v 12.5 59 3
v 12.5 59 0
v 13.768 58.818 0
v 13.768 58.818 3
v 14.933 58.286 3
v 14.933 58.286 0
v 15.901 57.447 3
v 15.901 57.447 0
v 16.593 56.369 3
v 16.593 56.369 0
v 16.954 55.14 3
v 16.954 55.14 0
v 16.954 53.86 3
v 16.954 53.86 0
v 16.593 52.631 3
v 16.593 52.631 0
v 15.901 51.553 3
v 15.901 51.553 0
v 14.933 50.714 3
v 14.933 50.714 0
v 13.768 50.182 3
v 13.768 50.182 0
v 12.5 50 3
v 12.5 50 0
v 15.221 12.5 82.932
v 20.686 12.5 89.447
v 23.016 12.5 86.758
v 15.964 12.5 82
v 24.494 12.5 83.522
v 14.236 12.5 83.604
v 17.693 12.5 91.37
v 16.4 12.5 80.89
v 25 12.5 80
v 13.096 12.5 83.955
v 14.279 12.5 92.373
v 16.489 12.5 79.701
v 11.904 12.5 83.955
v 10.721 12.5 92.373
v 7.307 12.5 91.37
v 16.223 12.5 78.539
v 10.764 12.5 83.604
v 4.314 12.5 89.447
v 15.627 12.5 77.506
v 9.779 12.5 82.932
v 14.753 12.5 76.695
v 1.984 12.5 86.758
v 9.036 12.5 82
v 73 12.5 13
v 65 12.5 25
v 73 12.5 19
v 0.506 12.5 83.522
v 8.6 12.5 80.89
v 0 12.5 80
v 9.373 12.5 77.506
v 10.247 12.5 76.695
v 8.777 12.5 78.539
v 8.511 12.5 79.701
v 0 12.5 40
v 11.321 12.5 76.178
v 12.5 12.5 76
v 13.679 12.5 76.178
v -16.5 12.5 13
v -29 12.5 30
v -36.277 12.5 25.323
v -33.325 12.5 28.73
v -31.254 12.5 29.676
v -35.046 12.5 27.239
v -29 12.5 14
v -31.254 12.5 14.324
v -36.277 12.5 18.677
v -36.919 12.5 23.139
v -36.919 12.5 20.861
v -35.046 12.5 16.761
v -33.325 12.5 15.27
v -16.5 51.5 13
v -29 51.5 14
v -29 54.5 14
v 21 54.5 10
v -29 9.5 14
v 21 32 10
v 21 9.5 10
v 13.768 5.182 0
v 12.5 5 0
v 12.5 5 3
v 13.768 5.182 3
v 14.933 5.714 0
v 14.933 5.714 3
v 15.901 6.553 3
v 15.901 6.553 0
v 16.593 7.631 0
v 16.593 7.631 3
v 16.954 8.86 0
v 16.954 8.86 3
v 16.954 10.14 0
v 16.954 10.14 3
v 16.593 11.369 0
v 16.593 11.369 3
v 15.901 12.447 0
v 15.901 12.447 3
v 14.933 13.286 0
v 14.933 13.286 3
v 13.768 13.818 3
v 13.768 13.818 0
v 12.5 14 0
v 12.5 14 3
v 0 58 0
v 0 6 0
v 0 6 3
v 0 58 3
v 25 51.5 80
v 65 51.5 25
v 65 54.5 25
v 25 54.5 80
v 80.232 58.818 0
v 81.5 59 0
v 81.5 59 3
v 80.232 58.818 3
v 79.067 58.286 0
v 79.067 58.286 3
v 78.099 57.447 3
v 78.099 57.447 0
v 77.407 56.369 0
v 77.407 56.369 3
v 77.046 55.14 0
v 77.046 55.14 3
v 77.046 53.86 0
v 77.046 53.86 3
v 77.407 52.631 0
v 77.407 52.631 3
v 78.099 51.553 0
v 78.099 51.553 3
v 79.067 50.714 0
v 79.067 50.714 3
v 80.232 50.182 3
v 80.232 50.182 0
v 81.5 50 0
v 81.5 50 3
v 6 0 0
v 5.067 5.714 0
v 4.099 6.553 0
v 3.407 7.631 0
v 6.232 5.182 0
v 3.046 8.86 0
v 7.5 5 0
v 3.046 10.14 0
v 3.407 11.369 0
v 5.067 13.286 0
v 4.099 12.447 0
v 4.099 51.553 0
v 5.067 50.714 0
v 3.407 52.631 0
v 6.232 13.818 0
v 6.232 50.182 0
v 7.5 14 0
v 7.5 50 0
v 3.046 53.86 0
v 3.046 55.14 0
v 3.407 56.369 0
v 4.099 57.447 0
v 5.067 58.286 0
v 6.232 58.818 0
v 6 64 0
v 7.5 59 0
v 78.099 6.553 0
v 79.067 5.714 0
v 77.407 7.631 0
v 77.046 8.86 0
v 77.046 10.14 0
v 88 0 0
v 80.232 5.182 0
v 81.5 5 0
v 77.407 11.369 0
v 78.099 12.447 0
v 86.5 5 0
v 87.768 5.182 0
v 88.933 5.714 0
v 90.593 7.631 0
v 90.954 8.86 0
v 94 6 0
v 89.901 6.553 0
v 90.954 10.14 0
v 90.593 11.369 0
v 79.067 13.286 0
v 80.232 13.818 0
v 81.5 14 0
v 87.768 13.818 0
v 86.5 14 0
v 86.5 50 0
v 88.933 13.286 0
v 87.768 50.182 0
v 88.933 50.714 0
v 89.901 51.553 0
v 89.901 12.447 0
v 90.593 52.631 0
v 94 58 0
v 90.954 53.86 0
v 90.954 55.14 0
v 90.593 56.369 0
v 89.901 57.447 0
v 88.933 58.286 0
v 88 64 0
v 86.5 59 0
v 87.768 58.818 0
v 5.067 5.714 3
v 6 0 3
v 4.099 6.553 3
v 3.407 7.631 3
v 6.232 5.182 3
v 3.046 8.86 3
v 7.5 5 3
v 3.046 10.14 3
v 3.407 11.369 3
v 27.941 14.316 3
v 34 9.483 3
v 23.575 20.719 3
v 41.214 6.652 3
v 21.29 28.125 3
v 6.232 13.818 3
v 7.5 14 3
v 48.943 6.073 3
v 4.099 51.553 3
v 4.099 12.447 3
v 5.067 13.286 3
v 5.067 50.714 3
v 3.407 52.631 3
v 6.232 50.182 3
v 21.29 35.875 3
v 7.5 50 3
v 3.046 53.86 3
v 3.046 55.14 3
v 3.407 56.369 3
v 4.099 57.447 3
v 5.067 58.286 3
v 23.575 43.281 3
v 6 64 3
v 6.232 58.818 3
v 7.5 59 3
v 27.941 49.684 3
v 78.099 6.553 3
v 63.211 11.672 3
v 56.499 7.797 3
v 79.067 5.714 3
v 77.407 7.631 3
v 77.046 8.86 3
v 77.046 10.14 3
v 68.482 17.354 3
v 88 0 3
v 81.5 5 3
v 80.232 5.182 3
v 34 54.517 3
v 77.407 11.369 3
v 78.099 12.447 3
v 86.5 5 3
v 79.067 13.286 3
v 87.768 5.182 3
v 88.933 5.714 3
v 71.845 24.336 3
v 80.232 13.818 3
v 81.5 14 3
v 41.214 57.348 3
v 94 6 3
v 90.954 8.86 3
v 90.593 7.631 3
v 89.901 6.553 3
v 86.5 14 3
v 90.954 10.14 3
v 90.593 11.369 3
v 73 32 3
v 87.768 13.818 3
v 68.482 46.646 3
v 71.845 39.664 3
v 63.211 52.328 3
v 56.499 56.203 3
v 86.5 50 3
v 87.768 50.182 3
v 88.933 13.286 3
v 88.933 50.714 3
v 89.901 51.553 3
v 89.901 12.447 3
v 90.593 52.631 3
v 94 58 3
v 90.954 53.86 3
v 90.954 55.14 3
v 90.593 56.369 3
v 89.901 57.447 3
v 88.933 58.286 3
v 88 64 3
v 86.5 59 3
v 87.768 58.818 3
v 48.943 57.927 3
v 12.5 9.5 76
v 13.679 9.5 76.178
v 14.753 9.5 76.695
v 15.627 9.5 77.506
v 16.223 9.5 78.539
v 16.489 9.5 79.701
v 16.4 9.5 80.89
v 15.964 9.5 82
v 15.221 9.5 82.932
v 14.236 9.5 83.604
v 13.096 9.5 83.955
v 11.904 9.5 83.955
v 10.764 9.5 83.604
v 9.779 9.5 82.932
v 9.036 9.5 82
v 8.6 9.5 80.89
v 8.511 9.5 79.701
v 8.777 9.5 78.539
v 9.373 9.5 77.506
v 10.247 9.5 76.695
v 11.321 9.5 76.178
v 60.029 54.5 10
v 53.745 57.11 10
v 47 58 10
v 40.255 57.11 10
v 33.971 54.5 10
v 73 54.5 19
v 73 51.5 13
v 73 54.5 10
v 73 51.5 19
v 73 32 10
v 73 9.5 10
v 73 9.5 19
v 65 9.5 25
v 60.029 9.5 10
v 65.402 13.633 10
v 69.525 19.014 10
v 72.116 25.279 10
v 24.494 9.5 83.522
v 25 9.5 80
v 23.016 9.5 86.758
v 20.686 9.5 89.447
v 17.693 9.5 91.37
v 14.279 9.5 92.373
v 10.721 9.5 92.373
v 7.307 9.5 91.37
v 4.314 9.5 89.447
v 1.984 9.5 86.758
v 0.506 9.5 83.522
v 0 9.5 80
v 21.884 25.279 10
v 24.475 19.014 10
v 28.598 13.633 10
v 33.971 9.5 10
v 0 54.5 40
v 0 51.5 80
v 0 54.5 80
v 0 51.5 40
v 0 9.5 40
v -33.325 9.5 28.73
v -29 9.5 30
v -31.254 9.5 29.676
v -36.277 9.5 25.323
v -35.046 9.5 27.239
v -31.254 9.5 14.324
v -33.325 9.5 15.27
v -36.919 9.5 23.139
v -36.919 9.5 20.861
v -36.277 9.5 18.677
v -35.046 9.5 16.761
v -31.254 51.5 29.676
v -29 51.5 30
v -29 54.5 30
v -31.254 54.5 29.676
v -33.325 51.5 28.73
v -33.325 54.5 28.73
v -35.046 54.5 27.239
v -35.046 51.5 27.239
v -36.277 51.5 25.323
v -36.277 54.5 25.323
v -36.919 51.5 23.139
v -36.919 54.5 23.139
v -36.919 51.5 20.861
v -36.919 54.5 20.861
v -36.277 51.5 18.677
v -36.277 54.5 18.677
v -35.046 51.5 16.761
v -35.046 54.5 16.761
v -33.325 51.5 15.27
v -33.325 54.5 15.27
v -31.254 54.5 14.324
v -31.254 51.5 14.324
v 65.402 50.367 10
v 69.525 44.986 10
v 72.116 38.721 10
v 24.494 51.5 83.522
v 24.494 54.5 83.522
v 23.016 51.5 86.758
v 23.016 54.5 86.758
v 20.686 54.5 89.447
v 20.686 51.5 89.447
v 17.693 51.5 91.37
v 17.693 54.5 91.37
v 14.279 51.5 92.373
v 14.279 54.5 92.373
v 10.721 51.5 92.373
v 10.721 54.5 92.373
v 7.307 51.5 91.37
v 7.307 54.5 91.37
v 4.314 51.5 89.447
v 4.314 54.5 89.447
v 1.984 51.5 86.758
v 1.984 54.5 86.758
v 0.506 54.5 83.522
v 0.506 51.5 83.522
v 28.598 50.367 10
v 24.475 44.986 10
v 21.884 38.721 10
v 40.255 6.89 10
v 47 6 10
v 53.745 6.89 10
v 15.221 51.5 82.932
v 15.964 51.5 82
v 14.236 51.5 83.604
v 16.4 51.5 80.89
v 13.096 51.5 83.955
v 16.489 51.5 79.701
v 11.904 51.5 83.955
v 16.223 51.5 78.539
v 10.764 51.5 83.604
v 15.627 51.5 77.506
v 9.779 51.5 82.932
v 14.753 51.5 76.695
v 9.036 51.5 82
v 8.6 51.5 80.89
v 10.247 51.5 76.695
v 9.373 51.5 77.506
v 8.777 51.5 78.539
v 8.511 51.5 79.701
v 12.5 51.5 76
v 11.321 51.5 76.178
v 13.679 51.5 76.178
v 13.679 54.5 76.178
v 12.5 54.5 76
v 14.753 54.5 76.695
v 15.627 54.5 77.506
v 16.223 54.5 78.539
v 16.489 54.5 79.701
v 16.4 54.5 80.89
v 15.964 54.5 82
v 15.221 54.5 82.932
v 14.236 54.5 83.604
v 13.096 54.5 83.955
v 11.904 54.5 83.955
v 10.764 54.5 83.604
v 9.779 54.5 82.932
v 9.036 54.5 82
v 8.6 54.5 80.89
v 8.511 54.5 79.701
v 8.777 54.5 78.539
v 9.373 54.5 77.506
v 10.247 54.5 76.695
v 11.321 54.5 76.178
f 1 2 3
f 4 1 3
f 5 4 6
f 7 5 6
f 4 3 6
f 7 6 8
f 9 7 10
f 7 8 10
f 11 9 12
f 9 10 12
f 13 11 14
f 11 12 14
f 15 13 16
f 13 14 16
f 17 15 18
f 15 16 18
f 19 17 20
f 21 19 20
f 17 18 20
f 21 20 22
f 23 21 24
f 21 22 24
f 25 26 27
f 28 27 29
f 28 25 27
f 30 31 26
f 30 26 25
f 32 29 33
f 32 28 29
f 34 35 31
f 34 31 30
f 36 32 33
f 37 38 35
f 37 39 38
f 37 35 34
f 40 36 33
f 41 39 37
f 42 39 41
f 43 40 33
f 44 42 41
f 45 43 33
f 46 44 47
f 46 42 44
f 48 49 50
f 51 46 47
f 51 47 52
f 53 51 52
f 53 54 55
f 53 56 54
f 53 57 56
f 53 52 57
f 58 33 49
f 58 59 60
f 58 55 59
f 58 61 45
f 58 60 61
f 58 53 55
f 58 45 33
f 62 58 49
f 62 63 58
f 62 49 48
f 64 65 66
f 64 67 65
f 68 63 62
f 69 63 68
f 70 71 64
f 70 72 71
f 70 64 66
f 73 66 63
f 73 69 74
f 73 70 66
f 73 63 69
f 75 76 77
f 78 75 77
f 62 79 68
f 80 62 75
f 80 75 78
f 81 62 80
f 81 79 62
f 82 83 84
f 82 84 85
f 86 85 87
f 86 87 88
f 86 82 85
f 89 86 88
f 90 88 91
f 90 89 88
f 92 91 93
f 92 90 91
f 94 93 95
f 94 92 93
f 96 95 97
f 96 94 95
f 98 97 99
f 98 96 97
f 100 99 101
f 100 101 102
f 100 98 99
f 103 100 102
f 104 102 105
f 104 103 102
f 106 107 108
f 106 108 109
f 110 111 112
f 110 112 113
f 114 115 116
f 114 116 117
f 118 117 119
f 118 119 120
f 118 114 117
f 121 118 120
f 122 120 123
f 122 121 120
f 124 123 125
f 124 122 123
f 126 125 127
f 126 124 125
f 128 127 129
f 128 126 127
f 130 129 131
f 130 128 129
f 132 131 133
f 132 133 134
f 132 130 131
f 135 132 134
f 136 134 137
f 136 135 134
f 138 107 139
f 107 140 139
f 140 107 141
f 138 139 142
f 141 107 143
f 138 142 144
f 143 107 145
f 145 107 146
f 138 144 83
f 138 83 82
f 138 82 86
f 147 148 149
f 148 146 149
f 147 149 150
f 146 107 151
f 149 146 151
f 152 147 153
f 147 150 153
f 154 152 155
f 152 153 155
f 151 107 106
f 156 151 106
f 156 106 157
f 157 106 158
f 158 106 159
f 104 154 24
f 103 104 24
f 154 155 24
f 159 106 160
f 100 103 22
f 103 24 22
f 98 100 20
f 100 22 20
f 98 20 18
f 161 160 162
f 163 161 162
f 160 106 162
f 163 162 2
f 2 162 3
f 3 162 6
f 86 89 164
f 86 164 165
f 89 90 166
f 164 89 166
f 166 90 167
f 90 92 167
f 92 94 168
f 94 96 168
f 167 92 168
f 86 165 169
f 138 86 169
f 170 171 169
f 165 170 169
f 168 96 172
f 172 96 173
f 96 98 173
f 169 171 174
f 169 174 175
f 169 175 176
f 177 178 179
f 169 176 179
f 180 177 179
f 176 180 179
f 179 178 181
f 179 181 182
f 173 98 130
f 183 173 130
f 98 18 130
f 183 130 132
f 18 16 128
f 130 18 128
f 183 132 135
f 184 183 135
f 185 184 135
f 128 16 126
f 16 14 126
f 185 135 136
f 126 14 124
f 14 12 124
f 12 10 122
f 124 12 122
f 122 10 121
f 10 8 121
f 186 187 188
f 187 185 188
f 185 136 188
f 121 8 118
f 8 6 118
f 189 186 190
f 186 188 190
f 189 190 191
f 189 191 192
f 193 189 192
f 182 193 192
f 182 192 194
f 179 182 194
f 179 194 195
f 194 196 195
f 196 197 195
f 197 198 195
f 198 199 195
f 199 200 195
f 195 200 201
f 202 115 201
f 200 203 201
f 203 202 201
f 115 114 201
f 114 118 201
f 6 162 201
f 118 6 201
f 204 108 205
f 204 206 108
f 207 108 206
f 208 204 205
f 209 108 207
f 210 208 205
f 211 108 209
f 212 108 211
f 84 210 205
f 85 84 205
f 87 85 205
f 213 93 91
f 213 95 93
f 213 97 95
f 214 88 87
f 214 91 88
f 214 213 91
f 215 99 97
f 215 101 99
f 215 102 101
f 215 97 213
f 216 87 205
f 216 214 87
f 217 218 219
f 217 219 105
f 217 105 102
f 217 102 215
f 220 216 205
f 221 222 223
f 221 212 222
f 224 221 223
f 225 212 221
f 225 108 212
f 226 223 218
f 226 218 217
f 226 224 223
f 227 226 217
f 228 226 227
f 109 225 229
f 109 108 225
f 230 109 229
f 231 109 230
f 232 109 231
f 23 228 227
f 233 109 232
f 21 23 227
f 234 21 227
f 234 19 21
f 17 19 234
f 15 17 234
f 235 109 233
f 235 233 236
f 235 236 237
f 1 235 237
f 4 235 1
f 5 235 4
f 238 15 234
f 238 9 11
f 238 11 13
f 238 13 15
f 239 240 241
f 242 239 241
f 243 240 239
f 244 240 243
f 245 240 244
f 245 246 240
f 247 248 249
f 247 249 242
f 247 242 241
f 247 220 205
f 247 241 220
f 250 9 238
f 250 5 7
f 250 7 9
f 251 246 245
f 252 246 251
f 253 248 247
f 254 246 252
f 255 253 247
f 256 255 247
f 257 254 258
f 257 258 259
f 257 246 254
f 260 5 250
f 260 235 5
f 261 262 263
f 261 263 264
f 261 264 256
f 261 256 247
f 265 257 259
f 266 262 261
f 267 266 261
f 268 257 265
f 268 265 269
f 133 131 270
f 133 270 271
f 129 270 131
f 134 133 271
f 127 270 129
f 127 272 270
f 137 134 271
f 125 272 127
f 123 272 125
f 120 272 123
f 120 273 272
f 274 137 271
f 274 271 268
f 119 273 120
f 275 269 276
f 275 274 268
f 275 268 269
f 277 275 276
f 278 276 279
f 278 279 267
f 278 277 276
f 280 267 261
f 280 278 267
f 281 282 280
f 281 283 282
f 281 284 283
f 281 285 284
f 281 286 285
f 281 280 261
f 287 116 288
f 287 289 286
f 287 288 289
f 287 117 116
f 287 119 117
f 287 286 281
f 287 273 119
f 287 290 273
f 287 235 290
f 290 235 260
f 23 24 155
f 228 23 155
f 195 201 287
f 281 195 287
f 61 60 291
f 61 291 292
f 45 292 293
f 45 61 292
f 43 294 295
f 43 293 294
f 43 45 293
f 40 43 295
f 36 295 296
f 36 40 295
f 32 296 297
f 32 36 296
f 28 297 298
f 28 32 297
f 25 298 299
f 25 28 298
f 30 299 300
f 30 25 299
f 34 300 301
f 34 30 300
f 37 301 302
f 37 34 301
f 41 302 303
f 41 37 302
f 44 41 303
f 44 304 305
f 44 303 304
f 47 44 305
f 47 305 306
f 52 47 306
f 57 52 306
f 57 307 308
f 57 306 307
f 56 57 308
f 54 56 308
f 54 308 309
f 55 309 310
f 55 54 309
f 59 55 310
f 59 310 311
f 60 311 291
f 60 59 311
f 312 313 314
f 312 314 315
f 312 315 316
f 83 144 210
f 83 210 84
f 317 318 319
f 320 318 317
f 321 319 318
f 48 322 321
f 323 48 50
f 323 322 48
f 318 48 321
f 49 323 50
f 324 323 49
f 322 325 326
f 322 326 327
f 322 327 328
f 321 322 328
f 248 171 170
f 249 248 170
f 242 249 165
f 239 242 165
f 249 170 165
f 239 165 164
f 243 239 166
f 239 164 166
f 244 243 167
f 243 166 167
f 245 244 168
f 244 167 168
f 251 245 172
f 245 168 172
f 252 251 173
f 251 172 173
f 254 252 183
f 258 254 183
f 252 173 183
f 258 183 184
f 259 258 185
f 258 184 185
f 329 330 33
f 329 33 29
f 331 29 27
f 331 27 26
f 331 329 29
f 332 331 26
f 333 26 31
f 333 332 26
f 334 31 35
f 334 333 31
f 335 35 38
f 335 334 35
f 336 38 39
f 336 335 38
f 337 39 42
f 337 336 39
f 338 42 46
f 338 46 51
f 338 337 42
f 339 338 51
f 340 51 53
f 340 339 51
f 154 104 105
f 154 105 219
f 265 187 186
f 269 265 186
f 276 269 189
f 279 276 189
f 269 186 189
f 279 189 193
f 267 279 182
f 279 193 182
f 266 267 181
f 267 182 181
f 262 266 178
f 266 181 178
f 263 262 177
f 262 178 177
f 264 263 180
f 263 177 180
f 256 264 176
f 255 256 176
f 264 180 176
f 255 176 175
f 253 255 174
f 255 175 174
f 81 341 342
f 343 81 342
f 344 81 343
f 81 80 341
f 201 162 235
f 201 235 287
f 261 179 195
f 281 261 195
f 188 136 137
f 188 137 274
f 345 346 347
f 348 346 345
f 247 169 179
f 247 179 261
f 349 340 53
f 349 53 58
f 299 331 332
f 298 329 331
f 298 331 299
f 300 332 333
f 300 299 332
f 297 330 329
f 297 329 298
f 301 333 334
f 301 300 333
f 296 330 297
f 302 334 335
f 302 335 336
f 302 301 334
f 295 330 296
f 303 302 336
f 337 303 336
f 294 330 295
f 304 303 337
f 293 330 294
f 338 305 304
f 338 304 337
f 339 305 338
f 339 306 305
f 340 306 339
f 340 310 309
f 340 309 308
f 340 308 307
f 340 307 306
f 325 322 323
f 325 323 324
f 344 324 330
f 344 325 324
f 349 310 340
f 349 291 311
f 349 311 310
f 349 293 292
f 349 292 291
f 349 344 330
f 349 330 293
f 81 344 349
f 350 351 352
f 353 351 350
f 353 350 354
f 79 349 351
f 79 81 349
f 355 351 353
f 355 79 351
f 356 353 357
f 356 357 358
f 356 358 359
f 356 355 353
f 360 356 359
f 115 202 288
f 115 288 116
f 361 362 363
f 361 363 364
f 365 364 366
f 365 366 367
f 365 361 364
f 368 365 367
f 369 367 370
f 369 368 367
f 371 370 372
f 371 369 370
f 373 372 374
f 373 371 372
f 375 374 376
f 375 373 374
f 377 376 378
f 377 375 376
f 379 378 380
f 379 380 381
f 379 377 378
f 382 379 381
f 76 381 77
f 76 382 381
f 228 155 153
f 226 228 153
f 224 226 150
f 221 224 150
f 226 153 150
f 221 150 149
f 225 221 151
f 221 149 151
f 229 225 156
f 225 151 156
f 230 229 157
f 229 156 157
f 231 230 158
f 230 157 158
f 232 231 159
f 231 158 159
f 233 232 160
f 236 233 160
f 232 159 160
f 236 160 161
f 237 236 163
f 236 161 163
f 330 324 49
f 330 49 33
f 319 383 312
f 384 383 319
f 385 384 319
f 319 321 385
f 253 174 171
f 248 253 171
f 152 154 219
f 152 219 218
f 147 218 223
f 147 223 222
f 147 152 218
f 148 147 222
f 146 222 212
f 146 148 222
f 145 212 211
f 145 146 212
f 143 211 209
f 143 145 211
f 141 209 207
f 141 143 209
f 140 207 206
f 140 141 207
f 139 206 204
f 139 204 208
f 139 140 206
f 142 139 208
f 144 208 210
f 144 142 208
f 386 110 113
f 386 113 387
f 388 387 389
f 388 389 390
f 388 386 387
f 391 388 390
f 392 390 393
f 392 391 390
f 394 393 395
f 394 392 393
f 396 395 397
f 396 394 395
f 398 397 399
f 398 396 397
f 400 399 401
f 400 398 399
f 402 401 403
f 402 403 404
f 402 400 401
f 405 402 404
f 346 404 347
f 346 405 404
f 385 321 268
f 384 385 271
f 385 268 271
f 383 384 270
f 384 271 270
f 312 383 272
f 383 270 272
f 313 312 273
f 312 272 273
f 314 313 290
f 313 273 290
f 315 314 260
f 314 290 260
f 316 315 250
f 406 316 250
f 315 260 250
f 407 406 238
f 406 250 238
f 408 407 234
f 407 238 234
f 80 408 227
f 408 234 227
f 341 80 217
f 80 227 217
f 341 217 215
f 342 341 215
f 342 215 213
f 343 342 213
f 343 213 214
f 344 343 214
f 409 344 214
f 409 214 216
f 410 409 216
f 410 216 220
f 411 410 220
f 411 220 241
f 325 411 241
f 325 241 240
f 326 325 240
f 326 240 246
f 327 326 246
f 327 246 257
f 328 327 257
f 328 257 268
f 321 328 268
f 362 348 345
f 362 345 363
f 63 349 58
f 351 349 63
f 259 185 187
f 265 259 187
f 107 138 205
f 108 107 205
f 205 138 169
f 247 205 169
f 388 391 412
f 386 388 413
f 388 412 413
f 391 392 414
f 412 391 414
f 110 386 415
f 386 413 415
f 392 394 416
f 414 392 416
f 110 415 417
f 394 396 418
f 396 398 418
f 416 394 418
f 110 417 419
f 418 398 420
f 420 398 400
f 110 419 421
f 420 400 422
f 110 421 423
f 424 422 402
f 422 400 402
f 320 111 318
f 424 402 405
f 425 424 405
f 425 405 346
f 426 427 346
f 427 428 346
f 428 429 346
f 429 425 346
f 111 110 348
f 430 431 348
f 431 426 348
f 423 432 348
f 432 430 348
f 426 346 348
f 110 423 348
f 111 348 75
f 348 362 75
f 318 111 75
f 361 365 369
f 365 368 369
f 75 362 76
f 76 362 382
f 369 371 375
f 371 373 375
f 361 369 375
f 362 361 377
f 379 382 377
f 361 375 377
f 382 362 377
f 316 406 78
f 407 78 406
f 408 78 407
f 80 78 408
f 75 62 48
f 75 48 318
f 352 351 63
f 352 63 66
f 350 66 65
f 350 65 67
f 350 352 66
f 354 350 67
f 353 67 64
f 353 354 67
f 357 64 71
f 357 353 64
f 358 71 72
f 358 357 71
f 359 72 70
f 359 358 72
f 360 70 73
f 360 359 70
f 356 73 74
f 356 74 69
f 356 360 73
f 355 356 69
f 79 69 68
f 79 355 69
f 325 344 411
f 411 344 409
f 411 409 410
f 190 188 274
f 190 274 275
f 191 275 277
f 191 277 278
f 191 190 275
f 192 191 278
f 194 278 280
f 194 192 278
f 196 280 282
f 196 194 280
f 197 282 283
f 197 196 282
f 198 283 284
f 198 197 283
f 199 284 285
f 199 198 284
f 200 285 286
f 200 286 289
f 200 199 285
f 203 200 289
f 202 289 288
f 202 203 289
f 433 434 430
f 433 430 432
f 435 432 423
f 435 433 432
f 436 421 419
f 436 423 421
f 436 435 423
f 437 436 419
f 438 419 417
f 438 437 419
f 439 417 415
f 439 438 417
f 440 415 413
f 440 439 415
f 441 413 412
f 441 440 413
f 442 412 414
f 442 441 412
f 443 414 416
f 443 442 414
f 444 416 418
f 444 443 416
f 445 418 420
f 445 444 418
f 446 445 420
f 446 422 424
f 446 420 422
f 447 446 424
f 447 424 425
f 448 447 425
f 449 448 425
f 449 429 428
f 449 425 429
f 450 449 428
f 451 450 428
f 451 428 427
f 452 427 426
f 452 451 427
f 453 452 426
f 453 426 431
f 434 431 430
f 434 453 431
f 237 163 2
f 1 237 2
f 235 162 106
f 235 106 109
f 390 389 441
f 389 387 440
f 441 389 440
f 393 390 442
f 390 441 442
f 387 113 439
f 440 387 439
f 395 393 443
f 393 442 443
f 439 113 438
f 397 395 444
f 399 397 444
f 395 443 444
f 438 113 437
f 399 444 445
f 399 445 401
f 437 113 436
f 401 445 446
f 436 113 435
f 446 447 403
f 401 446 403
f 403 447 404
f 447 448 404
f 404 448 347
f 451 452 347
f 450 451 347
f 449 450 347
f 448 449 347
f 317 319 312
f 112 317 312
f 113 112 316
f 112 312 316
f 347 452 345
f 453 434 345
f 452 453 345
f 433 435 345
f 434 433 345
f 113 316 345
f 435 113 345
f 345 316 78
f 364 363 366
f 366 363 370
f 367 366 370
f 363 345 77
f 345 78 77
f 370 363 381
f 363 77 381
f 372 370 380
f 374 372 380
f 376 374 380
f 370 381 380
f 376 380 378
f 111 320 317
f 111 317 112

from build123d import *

# Parameters (mm, degrees)
ESQUISSE1_W                  = 94
ESQUISSE1_H                  = 64
BOSS_EXTRU_1_DEPTH           = 3
ESQUISSE2_R                  = 26
BOSS_EXTRU_2_DEPTH           = 7
BOSS_EXTRU_3_DEPTH           = 22.5
BOSS_EXTRU_3_DEPTH_BACK      = 22.5
ENL_V_MAT_EXTRU_1_DEPTH      = 173.665138346
ENL_V_MAT_EXTRU_1_DEPTH_BACK = 173.665138346
ESQUISSE4_W                  = 86
ESQUISSE4_H                  = 39
ENL_V_MAT_EXTRU_2_DEPTH      = 143.697231928
ENL_V_MAT_EXTRU_2_DEPTH_BACK = 143.697231928
ESQUISSE5_R                  = 4
ENL_V_MAT_EXTRU_3_DEPTH      = 3
CHANFREIN1_SIZE              = 6


with BuildPart() as part:
    # Esquisse1 → Boss.-Extru.1 (new body)
    with BuildSketch(Plane.XY):
        with Locations((47, 32)):
            Rectangle(ESQUISSE1_W, ESQUISSE1_H)
    extrude(amount=BOSS_EXTRU_1_DEPTH)

    # Esquisse2 → Boss.-Extru.2 (add)
    with BuildSketch(Plane.XY.offset(3)):
        with Locations((47, 32)):
            Circle(ESQUISSE2_R)
    extrude(amount=BOSS_EXTRU_2_DEPTH)

    # Esquisse3 → Boss.-Extru.3 (add, two sides: drawn at the far end of the back side and taken through both)
    with BuildSketch(Plane(origin=(0, 32, 0), x_dir=(1, 0, 0), z_dir=(0, 1, 0)).offset(-BOSS_EXTRU_3_DEPTH_BACK)):
        with BuildLine():
            Line((73, -10), (73, -19))
            Line((73, -19), (65, -25))
            Line((65, -25), (25, -80))
            ThreePointArc((25, -80), (12.5, -92.5), (0, -80))
            Line((0, -80), (0, -40))
            Line((0, -40), (-29, -30))
            ThreePointArc((-29, -30), (-37, -22), (-29, -14))
            Line((-29, -14), (21, -10))
            Line((21, -10), (73, -10))
        make_face()
    extrude(amount=BOSS_EXTRU_3_DEPTH + BOSS_EXTRU_3_DEPTH_BACK)

    # Esquisse4 → Enlèv. mat.-Extru.1 (cut, two sides: drawn at the far end of the back side and taken through both)
    with BuildSketch(Plane(origin=(94, 0, 0), x_dir=(0, 0, -1), z_dir=(1, 0, 0)).offset(-ENL_V_MAT_EXTRU_1_DEPTH_BACK)):
        with Locations((-56, 32)):
            Rectangle(ESQUISSE4_W, ESQUISSE4_H)
    extrude(amount=ENL_V_MAT_EXTRU_1_DEPTH + ENL_V_MAT_EXTRU_1_DEPTH_BACK, mode=Mode.SUBTRACT)

    # Esquisse5 → Enlèv. mat.-Extru.2 (cut, two sides: drawn at the far end of the back side and taken through both)
    with BuildSketch(Plane.XZ.offset(-9.5).offset(-ENL_V_MAT_EXTRU_2_DEPTH_BACK)):
        with Locations(Location((12.5, 80, 0), (0, 0, 270))):
            Circle(ESQUISSE5_R)
    extrude(amount=ENL_V_MAT_EXTRU_2_DEPTH + ENL_V_MAT_EXTRU_2_DEPTH_BACK, mode=Mode.SUBTRACT)

    # Esquisse6 → Enlèv. mat.-Extru.3 (cut)
    with BuildSketch(Plane(origin=(0, 0, 0), x_dir=(-1, 0, 0), z_dir=(0, 0, -1))):
        with BuildLine():
            Line((-86.5, 59), (-81.5, 59))
            ThreePointArc((-81.5, 59), (-77, 54.5), (-81.5, 50))
            Line((-81.5, 50), (-86.5, 50))
            ThreePointArc((-86.5, 50), (-91, 54.5), (-86.5, 59))
        make_face()
        with BuildLine():
            Line((-7.5, 59), (-12.5, 59))
            ThreePointArc((-12.5, 59), (-17, 54.5), (-12.5, 50))
            Line((-12.5, 50), (-7.5, 50))
            ThreePointArc((-7.5, 50), (-3, 54.5), (-7.5, 59))
        make_face()
        with BuildLine():
            Line((-7.5, 5), (-12.5, 5))
            ThreePointArc((-12.5, 5), (-17, 9.5), (-12.5, 14))
            Line((-12.5, 14), (-7.5, 14))
            ThreePointArc((-7.5, 14), (-3, 9.5), (-7.5, 5))
        make_face()
        with BuildLine():
            Line((-86.5, 5), (-81.5, 5))
            ThreePointArc((-81.5, 5), (-77, 9.5), (-81.5, 14))
            Line((-81.5, 14), (-86.5, 14))
            ThreePointArc((-86.5, 14), (-91, 9.5), (-86.5, 5))
        make_face()
    extrude(amount=-ENL_V_MAT_EXTRU_3_DEPTH, mode=Mode.SUBTRACT)

    # Chanfrein1
    chanfrein1_edges = [part.edges().sort_by_distance(p)[0] for p in [
        (0, 64, 1.5),
        (94, 64, 1.5),
        (94, 0, 1.5),
        (0, 0, 1.5),
    ]]
    chamfer(chanfrein1_edges, length=CHANFREIN1_SIZE)


solid = part.part
